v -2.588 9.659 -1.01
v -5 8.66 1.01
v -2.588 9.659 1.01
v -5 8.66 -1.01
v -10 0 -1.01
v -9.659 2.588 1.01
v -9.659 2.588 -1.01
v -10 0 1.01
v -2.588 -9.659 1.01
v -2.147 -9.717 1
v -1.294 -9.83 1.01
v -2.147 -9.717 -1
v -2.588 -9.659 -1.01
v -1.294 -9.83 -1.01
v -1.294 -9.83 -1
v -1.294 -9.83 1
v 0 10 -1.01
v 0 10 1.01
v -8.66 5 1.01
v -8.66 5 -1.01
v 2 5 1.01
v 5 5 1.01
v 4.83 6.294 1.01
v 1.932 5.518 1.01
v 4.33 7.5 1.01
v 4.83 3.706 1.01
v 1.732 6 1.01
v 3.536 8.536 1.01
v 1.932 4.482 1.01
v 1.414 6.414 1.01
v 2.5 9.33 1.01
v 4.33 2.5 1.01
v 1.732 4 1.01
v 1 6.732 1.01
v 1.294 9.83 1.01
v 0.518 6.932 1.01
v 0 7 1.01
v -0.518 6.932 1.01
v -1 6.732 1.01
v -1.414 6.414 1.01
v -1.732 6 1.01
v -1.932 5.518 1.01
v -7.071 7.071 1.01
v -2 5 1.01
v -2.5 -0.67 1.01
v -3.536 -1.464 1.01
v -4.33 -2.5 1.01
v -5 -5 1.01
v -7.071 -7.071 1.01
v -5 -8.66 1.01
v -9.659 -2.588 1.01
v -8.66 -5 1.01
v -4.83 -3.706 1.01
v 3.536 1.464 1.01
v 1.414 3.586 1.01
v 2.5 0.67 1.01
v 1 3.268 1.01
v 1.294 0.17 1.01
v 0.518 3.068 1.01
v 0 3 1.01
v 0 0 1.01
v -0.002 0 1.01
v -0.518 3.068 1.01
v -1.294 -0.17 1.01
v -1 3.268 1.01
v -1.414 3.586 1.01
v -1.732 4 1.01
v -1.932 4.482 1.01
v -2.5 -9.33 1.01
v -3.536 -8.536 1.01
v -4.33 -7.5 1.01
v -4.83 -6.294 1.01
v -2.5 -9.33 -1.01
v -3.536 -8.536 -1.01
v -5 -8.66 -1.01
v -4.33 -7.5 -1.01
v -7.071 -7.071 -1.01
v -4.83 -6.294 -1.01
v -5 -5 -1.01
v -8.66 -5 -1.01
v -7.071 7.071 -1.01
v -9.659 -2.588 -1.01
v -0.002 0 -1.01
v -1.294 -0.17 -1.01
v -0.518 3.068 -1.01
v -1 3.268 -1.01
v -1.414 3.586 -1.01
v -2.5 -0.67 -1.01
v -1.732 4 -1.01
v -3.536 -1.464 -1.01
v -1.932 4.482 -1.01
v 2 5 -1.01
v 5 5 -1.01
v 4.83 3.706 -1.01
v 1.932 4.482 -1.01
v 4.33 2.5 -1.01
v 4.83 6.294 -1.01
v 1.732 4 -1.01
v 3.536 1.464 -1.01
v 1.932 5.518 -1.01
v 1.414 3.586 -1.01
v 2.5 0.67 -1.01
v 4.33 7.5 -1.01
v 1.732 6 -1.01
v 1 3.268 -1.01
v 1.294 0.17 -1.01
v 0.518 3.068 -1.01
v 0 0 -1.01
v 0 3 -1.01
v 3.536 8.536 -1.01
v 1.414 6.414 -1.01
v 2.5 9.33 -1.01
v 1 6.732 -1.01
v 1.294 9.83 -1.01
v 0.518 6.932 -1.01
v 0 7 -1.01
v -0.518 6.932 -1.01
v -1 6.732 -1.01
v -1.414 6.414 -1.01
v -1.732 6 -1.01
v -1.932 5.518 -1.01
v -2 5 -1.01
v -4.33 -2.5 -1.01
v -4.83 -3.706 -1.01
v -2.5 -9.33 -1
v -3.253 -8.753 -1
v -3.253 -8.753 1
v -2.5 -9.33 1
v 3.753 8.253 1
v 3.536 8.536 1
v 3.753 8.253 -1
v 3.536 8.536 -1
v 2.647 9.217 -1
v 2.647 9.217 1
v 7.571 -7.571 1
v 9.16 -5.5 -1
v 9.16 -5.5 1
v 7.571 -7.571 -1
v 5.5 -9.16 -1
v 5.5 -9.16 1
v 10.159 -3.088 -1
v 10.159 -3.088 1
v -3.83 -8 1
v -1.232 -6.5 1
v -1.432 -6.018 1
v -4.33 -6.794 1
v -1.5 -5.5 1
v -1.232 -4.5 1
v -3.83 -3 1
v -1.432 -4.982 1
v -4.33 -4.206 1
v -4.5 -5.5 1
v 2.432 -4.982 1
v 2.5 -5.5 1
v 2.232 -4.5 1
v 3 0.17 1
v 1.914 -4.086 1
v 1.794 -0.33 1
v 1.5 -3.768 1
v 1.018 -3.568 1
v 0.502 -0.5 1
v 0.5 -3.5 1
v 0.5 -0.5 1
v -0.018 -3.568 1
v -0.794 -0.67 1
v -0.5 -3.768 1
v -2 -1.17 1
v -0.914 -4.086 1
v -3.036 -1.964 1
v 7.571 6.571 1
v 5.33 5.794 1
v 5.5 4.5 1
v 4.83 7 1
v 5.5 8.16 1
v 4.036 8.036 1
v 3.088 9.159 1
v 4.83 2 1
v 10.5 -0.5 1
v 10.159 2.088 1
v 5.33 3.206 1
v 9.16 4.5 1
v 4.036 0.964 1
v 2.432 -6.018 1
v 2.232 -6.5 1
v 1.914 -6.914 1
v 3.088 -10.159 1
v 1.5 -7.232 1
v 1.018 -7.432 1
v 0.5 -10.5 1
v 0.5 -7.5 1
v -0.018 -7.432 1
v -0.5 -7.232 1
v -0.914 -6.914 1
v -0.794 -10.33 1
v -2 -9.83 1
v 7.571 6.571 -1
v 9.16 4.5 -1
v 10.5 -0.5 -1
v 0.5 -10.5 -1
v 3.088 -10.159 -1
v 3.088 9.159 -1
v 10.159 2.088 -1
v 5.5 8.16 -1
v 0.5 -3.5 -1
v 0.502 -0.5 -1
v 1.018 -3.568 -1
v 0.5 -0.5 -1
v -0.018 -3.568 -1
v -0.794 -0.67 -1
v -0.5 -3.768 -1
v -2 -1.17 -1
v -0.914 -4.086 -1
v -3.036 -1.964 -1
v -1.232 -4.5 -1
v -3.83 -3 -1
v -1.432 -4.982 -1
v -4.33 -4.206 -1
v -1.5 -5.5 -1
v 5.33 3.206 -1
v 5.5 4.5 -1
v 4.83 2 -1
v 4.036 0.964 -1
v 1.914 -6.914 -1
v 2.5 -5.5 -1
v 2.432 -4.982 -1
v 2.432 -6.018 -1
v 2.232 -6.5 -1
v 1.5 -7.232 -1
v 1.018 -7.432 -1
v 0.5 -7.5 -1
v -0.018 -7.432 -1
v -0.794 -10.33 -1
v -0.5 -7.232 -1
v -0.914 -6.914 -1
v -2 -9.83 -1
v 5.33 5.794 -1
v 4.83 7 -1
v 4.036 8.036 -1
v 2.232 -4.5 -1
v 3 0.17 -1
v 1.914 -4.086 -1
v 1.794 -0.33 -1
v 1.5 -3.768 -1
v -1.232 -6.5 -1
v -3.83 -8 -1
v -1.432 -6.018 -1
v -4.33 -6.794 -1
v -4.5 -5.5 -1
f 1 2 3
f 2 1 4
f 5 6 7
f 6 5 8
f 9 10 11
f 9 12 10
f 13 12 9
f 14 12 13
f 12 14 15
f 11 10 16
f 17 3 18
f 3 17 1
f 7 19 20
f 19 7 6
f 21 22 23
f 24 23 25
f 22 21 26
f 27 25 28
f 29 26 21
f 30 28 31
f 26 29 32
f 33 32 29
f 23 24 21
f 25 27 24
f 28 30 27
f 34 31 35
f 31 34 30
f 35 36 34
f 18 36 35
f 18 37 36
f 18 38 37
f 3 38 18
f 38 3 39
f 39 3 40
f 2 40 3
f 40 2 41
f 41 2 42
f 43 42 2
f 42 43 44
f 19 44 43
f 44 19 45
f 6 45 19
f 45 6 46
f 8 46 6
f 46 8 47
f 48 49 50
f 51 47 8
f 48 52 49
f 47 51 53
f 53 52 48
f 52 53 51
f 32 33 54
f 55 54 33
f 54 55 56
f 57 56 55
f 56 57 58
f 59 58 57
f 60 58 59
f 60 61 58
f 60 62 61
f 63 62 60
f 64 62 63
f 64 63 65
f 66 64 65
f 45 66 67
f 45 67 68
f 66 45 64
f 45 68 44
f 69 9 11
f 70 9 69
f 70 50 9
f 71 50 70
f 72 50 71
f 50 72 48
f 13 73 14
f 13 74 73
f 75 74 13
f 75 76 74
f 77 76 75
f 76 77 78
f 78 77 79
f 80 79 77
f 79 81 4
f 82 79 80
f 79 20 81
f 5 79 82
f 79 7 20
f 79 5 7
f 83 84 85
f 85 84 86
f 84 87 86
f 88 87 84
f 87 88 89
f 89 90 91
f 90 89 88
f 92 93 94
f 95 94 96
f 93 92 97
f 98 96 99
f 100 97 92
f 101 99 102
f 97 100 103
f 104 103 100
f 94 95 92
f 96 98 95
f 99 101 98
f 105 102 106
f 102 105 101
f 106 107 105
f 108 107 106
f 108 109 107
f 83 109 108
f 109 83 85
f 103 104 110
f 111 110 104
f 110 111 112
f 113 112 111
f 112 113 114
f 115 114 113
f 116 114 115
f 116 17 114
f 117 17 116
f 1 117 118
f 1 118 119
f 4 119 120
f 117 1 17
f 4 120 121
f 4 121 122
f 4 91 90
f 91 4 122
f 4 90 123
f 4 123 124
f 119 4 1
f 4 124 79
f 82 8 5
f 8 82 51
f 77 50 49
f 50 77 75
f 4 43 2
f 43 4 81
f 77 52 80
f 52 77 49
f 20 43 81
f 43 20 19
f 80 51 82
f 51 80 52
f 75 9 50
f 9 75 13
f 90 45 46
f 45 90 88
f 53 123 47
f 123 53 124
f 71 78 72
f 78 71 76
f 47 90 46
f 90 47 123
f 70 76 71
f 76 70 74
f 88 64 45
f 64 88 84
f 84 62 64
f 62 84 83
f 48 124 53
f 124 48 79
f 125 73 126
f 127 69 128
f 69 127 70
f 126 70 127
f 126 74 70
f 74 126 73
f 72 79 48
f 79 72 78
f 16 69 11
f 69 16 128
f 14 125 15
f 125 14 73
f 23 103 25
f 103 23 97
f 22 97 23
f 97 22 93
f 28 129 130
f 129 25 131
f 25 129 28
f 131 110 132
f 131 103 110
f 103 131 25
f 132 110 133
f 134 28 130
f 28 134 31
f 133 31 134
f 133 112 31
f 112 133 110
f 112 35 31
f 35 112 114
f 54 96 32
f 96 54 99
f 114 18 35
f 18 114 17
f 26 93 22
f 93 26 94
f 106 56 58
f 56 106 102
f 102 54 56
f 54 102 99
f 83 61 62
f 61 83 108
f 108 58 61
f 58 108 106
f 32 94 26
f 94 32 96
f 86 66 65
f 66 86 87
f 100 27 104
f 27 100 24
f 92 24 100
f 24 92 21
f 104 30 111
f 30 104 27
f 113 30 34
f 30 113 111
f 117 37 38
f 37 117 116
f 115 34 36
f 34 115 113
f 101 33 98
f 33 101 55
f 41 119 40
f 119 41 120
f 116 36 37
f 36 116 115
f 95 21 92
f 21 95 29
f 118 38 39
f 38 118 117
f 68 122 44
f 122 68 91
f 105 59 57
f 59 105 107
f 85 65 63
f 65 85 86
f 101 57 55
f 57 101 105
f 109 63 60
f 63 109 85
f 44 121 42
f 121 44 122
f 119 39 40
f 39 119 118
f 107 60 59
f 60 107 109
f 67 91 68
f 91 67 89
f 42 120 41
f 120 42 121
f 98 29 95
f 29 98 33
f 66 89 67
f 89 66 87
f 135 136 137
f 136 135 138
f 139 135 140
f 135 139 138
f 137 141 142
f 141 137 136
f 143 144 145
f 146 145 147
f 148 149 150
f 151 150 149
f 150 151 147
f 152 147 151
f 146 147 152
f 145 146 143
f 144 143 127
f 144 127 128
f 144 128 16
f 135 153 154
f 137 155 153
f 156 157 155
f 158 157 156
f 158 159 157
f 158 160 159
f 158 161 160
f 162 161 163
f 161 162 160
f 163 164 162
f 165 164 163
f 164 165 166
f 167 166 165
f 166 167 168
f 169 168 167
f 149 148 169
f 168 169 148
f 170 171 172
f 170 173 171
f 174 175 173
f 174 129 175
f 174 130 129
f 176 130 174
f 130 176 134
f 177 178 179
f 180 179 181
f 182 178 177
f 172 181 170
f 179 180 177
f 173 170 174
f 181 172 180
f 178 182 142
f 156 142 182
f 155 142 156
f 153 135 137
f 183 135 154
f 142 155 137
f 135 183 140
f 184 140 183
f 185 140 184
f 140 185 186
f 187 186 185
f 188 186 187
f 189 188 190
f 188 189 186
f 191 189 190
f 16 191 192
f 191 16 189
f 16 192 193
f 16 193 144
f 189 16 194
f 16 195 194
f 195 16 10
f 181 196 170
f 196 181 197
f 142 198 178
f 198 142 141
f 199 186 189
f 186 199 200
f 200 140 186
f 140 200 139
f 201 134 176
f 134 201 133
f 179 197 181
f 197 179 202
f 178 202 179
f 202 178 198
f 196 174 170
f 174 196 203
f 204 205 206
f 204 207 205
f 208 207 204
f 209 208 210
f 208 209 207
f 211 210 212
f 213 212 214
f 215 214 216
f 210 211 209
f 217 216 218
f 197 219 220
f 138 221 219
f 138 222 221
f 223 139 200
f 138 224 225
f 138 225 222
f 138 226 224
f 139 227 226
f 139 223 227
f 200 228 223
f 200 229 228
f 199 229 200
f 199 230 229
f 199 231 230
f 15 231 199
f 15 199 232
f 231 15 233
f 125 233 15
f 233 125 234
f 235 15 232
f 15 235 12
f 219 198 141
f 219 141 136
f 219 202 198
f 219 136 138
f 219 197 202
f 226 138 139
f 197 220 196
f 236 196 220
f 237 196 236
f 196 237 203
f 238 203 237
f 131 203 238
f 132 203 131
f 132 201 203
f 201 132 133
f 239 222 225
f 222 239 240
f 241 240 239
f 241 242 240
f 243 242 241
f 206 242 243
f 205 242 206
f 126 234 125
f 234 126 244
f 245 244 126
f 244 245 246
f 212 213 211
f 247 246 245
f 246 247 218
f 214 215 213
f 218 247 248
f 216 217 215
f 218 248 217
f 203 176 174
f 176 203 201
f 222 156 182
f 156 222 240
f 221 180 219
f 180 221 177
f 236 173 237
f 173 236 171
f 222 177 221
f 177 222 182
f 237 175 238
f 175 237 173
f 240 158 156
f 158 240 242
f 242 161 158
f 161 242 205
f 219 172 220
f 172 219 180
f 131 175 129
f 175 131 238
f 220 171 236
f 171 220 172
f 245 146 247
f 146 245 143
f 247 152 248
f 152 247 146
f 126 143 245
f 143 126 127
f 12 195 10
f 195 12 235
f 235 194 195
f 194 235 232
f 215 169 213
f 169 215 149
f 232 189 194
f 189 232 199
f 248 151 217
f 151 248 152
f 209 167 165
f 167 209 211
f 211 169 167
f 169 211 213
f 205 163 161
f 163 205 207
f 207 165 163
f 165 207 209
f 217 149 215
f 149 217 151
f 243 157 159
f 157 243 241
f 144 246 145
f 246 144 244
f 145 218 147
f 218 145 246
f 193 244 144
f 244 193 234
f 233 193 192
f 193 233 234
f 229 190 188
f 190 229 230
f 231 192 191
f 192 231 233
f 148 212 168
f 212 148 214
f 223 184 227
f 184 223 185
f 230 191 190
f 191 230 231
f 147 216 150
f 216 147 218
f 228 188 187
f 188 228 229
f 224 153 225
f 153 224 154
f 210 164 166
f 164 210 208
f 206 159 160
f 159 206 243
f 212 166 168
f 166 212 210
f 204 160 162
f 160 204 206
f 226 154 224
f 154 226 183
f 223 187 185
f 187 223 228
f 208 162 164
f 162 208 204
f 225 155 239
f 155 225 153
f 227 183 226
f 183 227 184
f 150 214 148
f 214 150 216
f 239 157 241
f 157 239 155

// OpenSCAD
joinfactor = 0.005;

yinyang(10, 2);

module halfyinyang(largeradius, focalradius, thickness = 2)
{
	smallradius = largeradius / 2;
	
	difference()
	{
		union()
		{
			difference()
			{
				cylinder(r=largeradius, h=thickness, center=true);
					
				translate([largeradius/2,0, 0])
				cube(size=[largeradius+joinfactor, (largeradius*2)+joinfactor*2, thickness+joinfactor*2], center=true);
		
				translate([0, -smallradius, 0])
				cylinder(r=smallradius, h=thickness+joinfactor, center=true);
			
			}
		
			translate([0, smallradius, 0])
			cylinder(r=smallradius, h=thickness, center=true);
		}

		translate([0, smallradius, 0])
		cylinder(r=focalradius, h =thickness+2*joinfactor, center=true );
	}
}

module yinyang(largeradius, focalradius, thickness = 2)
{
	// Color seems to even apply itself to the parts that have been
	// subtracted.  In this case, we print one half taller than the other
	// half to overcome the overwriting of the color.
	color([0,0,0])
	halfyinyang(largeradius, focalradius, thickness = thickness+joinfactor*4, $fn=24);

	color([1,1,1])
	translate([0.5, -0.5,0])
	rotate([0, 0, 180])
	halfyinyang(largeradius, focalradius, thickness, $fn=24);
}
